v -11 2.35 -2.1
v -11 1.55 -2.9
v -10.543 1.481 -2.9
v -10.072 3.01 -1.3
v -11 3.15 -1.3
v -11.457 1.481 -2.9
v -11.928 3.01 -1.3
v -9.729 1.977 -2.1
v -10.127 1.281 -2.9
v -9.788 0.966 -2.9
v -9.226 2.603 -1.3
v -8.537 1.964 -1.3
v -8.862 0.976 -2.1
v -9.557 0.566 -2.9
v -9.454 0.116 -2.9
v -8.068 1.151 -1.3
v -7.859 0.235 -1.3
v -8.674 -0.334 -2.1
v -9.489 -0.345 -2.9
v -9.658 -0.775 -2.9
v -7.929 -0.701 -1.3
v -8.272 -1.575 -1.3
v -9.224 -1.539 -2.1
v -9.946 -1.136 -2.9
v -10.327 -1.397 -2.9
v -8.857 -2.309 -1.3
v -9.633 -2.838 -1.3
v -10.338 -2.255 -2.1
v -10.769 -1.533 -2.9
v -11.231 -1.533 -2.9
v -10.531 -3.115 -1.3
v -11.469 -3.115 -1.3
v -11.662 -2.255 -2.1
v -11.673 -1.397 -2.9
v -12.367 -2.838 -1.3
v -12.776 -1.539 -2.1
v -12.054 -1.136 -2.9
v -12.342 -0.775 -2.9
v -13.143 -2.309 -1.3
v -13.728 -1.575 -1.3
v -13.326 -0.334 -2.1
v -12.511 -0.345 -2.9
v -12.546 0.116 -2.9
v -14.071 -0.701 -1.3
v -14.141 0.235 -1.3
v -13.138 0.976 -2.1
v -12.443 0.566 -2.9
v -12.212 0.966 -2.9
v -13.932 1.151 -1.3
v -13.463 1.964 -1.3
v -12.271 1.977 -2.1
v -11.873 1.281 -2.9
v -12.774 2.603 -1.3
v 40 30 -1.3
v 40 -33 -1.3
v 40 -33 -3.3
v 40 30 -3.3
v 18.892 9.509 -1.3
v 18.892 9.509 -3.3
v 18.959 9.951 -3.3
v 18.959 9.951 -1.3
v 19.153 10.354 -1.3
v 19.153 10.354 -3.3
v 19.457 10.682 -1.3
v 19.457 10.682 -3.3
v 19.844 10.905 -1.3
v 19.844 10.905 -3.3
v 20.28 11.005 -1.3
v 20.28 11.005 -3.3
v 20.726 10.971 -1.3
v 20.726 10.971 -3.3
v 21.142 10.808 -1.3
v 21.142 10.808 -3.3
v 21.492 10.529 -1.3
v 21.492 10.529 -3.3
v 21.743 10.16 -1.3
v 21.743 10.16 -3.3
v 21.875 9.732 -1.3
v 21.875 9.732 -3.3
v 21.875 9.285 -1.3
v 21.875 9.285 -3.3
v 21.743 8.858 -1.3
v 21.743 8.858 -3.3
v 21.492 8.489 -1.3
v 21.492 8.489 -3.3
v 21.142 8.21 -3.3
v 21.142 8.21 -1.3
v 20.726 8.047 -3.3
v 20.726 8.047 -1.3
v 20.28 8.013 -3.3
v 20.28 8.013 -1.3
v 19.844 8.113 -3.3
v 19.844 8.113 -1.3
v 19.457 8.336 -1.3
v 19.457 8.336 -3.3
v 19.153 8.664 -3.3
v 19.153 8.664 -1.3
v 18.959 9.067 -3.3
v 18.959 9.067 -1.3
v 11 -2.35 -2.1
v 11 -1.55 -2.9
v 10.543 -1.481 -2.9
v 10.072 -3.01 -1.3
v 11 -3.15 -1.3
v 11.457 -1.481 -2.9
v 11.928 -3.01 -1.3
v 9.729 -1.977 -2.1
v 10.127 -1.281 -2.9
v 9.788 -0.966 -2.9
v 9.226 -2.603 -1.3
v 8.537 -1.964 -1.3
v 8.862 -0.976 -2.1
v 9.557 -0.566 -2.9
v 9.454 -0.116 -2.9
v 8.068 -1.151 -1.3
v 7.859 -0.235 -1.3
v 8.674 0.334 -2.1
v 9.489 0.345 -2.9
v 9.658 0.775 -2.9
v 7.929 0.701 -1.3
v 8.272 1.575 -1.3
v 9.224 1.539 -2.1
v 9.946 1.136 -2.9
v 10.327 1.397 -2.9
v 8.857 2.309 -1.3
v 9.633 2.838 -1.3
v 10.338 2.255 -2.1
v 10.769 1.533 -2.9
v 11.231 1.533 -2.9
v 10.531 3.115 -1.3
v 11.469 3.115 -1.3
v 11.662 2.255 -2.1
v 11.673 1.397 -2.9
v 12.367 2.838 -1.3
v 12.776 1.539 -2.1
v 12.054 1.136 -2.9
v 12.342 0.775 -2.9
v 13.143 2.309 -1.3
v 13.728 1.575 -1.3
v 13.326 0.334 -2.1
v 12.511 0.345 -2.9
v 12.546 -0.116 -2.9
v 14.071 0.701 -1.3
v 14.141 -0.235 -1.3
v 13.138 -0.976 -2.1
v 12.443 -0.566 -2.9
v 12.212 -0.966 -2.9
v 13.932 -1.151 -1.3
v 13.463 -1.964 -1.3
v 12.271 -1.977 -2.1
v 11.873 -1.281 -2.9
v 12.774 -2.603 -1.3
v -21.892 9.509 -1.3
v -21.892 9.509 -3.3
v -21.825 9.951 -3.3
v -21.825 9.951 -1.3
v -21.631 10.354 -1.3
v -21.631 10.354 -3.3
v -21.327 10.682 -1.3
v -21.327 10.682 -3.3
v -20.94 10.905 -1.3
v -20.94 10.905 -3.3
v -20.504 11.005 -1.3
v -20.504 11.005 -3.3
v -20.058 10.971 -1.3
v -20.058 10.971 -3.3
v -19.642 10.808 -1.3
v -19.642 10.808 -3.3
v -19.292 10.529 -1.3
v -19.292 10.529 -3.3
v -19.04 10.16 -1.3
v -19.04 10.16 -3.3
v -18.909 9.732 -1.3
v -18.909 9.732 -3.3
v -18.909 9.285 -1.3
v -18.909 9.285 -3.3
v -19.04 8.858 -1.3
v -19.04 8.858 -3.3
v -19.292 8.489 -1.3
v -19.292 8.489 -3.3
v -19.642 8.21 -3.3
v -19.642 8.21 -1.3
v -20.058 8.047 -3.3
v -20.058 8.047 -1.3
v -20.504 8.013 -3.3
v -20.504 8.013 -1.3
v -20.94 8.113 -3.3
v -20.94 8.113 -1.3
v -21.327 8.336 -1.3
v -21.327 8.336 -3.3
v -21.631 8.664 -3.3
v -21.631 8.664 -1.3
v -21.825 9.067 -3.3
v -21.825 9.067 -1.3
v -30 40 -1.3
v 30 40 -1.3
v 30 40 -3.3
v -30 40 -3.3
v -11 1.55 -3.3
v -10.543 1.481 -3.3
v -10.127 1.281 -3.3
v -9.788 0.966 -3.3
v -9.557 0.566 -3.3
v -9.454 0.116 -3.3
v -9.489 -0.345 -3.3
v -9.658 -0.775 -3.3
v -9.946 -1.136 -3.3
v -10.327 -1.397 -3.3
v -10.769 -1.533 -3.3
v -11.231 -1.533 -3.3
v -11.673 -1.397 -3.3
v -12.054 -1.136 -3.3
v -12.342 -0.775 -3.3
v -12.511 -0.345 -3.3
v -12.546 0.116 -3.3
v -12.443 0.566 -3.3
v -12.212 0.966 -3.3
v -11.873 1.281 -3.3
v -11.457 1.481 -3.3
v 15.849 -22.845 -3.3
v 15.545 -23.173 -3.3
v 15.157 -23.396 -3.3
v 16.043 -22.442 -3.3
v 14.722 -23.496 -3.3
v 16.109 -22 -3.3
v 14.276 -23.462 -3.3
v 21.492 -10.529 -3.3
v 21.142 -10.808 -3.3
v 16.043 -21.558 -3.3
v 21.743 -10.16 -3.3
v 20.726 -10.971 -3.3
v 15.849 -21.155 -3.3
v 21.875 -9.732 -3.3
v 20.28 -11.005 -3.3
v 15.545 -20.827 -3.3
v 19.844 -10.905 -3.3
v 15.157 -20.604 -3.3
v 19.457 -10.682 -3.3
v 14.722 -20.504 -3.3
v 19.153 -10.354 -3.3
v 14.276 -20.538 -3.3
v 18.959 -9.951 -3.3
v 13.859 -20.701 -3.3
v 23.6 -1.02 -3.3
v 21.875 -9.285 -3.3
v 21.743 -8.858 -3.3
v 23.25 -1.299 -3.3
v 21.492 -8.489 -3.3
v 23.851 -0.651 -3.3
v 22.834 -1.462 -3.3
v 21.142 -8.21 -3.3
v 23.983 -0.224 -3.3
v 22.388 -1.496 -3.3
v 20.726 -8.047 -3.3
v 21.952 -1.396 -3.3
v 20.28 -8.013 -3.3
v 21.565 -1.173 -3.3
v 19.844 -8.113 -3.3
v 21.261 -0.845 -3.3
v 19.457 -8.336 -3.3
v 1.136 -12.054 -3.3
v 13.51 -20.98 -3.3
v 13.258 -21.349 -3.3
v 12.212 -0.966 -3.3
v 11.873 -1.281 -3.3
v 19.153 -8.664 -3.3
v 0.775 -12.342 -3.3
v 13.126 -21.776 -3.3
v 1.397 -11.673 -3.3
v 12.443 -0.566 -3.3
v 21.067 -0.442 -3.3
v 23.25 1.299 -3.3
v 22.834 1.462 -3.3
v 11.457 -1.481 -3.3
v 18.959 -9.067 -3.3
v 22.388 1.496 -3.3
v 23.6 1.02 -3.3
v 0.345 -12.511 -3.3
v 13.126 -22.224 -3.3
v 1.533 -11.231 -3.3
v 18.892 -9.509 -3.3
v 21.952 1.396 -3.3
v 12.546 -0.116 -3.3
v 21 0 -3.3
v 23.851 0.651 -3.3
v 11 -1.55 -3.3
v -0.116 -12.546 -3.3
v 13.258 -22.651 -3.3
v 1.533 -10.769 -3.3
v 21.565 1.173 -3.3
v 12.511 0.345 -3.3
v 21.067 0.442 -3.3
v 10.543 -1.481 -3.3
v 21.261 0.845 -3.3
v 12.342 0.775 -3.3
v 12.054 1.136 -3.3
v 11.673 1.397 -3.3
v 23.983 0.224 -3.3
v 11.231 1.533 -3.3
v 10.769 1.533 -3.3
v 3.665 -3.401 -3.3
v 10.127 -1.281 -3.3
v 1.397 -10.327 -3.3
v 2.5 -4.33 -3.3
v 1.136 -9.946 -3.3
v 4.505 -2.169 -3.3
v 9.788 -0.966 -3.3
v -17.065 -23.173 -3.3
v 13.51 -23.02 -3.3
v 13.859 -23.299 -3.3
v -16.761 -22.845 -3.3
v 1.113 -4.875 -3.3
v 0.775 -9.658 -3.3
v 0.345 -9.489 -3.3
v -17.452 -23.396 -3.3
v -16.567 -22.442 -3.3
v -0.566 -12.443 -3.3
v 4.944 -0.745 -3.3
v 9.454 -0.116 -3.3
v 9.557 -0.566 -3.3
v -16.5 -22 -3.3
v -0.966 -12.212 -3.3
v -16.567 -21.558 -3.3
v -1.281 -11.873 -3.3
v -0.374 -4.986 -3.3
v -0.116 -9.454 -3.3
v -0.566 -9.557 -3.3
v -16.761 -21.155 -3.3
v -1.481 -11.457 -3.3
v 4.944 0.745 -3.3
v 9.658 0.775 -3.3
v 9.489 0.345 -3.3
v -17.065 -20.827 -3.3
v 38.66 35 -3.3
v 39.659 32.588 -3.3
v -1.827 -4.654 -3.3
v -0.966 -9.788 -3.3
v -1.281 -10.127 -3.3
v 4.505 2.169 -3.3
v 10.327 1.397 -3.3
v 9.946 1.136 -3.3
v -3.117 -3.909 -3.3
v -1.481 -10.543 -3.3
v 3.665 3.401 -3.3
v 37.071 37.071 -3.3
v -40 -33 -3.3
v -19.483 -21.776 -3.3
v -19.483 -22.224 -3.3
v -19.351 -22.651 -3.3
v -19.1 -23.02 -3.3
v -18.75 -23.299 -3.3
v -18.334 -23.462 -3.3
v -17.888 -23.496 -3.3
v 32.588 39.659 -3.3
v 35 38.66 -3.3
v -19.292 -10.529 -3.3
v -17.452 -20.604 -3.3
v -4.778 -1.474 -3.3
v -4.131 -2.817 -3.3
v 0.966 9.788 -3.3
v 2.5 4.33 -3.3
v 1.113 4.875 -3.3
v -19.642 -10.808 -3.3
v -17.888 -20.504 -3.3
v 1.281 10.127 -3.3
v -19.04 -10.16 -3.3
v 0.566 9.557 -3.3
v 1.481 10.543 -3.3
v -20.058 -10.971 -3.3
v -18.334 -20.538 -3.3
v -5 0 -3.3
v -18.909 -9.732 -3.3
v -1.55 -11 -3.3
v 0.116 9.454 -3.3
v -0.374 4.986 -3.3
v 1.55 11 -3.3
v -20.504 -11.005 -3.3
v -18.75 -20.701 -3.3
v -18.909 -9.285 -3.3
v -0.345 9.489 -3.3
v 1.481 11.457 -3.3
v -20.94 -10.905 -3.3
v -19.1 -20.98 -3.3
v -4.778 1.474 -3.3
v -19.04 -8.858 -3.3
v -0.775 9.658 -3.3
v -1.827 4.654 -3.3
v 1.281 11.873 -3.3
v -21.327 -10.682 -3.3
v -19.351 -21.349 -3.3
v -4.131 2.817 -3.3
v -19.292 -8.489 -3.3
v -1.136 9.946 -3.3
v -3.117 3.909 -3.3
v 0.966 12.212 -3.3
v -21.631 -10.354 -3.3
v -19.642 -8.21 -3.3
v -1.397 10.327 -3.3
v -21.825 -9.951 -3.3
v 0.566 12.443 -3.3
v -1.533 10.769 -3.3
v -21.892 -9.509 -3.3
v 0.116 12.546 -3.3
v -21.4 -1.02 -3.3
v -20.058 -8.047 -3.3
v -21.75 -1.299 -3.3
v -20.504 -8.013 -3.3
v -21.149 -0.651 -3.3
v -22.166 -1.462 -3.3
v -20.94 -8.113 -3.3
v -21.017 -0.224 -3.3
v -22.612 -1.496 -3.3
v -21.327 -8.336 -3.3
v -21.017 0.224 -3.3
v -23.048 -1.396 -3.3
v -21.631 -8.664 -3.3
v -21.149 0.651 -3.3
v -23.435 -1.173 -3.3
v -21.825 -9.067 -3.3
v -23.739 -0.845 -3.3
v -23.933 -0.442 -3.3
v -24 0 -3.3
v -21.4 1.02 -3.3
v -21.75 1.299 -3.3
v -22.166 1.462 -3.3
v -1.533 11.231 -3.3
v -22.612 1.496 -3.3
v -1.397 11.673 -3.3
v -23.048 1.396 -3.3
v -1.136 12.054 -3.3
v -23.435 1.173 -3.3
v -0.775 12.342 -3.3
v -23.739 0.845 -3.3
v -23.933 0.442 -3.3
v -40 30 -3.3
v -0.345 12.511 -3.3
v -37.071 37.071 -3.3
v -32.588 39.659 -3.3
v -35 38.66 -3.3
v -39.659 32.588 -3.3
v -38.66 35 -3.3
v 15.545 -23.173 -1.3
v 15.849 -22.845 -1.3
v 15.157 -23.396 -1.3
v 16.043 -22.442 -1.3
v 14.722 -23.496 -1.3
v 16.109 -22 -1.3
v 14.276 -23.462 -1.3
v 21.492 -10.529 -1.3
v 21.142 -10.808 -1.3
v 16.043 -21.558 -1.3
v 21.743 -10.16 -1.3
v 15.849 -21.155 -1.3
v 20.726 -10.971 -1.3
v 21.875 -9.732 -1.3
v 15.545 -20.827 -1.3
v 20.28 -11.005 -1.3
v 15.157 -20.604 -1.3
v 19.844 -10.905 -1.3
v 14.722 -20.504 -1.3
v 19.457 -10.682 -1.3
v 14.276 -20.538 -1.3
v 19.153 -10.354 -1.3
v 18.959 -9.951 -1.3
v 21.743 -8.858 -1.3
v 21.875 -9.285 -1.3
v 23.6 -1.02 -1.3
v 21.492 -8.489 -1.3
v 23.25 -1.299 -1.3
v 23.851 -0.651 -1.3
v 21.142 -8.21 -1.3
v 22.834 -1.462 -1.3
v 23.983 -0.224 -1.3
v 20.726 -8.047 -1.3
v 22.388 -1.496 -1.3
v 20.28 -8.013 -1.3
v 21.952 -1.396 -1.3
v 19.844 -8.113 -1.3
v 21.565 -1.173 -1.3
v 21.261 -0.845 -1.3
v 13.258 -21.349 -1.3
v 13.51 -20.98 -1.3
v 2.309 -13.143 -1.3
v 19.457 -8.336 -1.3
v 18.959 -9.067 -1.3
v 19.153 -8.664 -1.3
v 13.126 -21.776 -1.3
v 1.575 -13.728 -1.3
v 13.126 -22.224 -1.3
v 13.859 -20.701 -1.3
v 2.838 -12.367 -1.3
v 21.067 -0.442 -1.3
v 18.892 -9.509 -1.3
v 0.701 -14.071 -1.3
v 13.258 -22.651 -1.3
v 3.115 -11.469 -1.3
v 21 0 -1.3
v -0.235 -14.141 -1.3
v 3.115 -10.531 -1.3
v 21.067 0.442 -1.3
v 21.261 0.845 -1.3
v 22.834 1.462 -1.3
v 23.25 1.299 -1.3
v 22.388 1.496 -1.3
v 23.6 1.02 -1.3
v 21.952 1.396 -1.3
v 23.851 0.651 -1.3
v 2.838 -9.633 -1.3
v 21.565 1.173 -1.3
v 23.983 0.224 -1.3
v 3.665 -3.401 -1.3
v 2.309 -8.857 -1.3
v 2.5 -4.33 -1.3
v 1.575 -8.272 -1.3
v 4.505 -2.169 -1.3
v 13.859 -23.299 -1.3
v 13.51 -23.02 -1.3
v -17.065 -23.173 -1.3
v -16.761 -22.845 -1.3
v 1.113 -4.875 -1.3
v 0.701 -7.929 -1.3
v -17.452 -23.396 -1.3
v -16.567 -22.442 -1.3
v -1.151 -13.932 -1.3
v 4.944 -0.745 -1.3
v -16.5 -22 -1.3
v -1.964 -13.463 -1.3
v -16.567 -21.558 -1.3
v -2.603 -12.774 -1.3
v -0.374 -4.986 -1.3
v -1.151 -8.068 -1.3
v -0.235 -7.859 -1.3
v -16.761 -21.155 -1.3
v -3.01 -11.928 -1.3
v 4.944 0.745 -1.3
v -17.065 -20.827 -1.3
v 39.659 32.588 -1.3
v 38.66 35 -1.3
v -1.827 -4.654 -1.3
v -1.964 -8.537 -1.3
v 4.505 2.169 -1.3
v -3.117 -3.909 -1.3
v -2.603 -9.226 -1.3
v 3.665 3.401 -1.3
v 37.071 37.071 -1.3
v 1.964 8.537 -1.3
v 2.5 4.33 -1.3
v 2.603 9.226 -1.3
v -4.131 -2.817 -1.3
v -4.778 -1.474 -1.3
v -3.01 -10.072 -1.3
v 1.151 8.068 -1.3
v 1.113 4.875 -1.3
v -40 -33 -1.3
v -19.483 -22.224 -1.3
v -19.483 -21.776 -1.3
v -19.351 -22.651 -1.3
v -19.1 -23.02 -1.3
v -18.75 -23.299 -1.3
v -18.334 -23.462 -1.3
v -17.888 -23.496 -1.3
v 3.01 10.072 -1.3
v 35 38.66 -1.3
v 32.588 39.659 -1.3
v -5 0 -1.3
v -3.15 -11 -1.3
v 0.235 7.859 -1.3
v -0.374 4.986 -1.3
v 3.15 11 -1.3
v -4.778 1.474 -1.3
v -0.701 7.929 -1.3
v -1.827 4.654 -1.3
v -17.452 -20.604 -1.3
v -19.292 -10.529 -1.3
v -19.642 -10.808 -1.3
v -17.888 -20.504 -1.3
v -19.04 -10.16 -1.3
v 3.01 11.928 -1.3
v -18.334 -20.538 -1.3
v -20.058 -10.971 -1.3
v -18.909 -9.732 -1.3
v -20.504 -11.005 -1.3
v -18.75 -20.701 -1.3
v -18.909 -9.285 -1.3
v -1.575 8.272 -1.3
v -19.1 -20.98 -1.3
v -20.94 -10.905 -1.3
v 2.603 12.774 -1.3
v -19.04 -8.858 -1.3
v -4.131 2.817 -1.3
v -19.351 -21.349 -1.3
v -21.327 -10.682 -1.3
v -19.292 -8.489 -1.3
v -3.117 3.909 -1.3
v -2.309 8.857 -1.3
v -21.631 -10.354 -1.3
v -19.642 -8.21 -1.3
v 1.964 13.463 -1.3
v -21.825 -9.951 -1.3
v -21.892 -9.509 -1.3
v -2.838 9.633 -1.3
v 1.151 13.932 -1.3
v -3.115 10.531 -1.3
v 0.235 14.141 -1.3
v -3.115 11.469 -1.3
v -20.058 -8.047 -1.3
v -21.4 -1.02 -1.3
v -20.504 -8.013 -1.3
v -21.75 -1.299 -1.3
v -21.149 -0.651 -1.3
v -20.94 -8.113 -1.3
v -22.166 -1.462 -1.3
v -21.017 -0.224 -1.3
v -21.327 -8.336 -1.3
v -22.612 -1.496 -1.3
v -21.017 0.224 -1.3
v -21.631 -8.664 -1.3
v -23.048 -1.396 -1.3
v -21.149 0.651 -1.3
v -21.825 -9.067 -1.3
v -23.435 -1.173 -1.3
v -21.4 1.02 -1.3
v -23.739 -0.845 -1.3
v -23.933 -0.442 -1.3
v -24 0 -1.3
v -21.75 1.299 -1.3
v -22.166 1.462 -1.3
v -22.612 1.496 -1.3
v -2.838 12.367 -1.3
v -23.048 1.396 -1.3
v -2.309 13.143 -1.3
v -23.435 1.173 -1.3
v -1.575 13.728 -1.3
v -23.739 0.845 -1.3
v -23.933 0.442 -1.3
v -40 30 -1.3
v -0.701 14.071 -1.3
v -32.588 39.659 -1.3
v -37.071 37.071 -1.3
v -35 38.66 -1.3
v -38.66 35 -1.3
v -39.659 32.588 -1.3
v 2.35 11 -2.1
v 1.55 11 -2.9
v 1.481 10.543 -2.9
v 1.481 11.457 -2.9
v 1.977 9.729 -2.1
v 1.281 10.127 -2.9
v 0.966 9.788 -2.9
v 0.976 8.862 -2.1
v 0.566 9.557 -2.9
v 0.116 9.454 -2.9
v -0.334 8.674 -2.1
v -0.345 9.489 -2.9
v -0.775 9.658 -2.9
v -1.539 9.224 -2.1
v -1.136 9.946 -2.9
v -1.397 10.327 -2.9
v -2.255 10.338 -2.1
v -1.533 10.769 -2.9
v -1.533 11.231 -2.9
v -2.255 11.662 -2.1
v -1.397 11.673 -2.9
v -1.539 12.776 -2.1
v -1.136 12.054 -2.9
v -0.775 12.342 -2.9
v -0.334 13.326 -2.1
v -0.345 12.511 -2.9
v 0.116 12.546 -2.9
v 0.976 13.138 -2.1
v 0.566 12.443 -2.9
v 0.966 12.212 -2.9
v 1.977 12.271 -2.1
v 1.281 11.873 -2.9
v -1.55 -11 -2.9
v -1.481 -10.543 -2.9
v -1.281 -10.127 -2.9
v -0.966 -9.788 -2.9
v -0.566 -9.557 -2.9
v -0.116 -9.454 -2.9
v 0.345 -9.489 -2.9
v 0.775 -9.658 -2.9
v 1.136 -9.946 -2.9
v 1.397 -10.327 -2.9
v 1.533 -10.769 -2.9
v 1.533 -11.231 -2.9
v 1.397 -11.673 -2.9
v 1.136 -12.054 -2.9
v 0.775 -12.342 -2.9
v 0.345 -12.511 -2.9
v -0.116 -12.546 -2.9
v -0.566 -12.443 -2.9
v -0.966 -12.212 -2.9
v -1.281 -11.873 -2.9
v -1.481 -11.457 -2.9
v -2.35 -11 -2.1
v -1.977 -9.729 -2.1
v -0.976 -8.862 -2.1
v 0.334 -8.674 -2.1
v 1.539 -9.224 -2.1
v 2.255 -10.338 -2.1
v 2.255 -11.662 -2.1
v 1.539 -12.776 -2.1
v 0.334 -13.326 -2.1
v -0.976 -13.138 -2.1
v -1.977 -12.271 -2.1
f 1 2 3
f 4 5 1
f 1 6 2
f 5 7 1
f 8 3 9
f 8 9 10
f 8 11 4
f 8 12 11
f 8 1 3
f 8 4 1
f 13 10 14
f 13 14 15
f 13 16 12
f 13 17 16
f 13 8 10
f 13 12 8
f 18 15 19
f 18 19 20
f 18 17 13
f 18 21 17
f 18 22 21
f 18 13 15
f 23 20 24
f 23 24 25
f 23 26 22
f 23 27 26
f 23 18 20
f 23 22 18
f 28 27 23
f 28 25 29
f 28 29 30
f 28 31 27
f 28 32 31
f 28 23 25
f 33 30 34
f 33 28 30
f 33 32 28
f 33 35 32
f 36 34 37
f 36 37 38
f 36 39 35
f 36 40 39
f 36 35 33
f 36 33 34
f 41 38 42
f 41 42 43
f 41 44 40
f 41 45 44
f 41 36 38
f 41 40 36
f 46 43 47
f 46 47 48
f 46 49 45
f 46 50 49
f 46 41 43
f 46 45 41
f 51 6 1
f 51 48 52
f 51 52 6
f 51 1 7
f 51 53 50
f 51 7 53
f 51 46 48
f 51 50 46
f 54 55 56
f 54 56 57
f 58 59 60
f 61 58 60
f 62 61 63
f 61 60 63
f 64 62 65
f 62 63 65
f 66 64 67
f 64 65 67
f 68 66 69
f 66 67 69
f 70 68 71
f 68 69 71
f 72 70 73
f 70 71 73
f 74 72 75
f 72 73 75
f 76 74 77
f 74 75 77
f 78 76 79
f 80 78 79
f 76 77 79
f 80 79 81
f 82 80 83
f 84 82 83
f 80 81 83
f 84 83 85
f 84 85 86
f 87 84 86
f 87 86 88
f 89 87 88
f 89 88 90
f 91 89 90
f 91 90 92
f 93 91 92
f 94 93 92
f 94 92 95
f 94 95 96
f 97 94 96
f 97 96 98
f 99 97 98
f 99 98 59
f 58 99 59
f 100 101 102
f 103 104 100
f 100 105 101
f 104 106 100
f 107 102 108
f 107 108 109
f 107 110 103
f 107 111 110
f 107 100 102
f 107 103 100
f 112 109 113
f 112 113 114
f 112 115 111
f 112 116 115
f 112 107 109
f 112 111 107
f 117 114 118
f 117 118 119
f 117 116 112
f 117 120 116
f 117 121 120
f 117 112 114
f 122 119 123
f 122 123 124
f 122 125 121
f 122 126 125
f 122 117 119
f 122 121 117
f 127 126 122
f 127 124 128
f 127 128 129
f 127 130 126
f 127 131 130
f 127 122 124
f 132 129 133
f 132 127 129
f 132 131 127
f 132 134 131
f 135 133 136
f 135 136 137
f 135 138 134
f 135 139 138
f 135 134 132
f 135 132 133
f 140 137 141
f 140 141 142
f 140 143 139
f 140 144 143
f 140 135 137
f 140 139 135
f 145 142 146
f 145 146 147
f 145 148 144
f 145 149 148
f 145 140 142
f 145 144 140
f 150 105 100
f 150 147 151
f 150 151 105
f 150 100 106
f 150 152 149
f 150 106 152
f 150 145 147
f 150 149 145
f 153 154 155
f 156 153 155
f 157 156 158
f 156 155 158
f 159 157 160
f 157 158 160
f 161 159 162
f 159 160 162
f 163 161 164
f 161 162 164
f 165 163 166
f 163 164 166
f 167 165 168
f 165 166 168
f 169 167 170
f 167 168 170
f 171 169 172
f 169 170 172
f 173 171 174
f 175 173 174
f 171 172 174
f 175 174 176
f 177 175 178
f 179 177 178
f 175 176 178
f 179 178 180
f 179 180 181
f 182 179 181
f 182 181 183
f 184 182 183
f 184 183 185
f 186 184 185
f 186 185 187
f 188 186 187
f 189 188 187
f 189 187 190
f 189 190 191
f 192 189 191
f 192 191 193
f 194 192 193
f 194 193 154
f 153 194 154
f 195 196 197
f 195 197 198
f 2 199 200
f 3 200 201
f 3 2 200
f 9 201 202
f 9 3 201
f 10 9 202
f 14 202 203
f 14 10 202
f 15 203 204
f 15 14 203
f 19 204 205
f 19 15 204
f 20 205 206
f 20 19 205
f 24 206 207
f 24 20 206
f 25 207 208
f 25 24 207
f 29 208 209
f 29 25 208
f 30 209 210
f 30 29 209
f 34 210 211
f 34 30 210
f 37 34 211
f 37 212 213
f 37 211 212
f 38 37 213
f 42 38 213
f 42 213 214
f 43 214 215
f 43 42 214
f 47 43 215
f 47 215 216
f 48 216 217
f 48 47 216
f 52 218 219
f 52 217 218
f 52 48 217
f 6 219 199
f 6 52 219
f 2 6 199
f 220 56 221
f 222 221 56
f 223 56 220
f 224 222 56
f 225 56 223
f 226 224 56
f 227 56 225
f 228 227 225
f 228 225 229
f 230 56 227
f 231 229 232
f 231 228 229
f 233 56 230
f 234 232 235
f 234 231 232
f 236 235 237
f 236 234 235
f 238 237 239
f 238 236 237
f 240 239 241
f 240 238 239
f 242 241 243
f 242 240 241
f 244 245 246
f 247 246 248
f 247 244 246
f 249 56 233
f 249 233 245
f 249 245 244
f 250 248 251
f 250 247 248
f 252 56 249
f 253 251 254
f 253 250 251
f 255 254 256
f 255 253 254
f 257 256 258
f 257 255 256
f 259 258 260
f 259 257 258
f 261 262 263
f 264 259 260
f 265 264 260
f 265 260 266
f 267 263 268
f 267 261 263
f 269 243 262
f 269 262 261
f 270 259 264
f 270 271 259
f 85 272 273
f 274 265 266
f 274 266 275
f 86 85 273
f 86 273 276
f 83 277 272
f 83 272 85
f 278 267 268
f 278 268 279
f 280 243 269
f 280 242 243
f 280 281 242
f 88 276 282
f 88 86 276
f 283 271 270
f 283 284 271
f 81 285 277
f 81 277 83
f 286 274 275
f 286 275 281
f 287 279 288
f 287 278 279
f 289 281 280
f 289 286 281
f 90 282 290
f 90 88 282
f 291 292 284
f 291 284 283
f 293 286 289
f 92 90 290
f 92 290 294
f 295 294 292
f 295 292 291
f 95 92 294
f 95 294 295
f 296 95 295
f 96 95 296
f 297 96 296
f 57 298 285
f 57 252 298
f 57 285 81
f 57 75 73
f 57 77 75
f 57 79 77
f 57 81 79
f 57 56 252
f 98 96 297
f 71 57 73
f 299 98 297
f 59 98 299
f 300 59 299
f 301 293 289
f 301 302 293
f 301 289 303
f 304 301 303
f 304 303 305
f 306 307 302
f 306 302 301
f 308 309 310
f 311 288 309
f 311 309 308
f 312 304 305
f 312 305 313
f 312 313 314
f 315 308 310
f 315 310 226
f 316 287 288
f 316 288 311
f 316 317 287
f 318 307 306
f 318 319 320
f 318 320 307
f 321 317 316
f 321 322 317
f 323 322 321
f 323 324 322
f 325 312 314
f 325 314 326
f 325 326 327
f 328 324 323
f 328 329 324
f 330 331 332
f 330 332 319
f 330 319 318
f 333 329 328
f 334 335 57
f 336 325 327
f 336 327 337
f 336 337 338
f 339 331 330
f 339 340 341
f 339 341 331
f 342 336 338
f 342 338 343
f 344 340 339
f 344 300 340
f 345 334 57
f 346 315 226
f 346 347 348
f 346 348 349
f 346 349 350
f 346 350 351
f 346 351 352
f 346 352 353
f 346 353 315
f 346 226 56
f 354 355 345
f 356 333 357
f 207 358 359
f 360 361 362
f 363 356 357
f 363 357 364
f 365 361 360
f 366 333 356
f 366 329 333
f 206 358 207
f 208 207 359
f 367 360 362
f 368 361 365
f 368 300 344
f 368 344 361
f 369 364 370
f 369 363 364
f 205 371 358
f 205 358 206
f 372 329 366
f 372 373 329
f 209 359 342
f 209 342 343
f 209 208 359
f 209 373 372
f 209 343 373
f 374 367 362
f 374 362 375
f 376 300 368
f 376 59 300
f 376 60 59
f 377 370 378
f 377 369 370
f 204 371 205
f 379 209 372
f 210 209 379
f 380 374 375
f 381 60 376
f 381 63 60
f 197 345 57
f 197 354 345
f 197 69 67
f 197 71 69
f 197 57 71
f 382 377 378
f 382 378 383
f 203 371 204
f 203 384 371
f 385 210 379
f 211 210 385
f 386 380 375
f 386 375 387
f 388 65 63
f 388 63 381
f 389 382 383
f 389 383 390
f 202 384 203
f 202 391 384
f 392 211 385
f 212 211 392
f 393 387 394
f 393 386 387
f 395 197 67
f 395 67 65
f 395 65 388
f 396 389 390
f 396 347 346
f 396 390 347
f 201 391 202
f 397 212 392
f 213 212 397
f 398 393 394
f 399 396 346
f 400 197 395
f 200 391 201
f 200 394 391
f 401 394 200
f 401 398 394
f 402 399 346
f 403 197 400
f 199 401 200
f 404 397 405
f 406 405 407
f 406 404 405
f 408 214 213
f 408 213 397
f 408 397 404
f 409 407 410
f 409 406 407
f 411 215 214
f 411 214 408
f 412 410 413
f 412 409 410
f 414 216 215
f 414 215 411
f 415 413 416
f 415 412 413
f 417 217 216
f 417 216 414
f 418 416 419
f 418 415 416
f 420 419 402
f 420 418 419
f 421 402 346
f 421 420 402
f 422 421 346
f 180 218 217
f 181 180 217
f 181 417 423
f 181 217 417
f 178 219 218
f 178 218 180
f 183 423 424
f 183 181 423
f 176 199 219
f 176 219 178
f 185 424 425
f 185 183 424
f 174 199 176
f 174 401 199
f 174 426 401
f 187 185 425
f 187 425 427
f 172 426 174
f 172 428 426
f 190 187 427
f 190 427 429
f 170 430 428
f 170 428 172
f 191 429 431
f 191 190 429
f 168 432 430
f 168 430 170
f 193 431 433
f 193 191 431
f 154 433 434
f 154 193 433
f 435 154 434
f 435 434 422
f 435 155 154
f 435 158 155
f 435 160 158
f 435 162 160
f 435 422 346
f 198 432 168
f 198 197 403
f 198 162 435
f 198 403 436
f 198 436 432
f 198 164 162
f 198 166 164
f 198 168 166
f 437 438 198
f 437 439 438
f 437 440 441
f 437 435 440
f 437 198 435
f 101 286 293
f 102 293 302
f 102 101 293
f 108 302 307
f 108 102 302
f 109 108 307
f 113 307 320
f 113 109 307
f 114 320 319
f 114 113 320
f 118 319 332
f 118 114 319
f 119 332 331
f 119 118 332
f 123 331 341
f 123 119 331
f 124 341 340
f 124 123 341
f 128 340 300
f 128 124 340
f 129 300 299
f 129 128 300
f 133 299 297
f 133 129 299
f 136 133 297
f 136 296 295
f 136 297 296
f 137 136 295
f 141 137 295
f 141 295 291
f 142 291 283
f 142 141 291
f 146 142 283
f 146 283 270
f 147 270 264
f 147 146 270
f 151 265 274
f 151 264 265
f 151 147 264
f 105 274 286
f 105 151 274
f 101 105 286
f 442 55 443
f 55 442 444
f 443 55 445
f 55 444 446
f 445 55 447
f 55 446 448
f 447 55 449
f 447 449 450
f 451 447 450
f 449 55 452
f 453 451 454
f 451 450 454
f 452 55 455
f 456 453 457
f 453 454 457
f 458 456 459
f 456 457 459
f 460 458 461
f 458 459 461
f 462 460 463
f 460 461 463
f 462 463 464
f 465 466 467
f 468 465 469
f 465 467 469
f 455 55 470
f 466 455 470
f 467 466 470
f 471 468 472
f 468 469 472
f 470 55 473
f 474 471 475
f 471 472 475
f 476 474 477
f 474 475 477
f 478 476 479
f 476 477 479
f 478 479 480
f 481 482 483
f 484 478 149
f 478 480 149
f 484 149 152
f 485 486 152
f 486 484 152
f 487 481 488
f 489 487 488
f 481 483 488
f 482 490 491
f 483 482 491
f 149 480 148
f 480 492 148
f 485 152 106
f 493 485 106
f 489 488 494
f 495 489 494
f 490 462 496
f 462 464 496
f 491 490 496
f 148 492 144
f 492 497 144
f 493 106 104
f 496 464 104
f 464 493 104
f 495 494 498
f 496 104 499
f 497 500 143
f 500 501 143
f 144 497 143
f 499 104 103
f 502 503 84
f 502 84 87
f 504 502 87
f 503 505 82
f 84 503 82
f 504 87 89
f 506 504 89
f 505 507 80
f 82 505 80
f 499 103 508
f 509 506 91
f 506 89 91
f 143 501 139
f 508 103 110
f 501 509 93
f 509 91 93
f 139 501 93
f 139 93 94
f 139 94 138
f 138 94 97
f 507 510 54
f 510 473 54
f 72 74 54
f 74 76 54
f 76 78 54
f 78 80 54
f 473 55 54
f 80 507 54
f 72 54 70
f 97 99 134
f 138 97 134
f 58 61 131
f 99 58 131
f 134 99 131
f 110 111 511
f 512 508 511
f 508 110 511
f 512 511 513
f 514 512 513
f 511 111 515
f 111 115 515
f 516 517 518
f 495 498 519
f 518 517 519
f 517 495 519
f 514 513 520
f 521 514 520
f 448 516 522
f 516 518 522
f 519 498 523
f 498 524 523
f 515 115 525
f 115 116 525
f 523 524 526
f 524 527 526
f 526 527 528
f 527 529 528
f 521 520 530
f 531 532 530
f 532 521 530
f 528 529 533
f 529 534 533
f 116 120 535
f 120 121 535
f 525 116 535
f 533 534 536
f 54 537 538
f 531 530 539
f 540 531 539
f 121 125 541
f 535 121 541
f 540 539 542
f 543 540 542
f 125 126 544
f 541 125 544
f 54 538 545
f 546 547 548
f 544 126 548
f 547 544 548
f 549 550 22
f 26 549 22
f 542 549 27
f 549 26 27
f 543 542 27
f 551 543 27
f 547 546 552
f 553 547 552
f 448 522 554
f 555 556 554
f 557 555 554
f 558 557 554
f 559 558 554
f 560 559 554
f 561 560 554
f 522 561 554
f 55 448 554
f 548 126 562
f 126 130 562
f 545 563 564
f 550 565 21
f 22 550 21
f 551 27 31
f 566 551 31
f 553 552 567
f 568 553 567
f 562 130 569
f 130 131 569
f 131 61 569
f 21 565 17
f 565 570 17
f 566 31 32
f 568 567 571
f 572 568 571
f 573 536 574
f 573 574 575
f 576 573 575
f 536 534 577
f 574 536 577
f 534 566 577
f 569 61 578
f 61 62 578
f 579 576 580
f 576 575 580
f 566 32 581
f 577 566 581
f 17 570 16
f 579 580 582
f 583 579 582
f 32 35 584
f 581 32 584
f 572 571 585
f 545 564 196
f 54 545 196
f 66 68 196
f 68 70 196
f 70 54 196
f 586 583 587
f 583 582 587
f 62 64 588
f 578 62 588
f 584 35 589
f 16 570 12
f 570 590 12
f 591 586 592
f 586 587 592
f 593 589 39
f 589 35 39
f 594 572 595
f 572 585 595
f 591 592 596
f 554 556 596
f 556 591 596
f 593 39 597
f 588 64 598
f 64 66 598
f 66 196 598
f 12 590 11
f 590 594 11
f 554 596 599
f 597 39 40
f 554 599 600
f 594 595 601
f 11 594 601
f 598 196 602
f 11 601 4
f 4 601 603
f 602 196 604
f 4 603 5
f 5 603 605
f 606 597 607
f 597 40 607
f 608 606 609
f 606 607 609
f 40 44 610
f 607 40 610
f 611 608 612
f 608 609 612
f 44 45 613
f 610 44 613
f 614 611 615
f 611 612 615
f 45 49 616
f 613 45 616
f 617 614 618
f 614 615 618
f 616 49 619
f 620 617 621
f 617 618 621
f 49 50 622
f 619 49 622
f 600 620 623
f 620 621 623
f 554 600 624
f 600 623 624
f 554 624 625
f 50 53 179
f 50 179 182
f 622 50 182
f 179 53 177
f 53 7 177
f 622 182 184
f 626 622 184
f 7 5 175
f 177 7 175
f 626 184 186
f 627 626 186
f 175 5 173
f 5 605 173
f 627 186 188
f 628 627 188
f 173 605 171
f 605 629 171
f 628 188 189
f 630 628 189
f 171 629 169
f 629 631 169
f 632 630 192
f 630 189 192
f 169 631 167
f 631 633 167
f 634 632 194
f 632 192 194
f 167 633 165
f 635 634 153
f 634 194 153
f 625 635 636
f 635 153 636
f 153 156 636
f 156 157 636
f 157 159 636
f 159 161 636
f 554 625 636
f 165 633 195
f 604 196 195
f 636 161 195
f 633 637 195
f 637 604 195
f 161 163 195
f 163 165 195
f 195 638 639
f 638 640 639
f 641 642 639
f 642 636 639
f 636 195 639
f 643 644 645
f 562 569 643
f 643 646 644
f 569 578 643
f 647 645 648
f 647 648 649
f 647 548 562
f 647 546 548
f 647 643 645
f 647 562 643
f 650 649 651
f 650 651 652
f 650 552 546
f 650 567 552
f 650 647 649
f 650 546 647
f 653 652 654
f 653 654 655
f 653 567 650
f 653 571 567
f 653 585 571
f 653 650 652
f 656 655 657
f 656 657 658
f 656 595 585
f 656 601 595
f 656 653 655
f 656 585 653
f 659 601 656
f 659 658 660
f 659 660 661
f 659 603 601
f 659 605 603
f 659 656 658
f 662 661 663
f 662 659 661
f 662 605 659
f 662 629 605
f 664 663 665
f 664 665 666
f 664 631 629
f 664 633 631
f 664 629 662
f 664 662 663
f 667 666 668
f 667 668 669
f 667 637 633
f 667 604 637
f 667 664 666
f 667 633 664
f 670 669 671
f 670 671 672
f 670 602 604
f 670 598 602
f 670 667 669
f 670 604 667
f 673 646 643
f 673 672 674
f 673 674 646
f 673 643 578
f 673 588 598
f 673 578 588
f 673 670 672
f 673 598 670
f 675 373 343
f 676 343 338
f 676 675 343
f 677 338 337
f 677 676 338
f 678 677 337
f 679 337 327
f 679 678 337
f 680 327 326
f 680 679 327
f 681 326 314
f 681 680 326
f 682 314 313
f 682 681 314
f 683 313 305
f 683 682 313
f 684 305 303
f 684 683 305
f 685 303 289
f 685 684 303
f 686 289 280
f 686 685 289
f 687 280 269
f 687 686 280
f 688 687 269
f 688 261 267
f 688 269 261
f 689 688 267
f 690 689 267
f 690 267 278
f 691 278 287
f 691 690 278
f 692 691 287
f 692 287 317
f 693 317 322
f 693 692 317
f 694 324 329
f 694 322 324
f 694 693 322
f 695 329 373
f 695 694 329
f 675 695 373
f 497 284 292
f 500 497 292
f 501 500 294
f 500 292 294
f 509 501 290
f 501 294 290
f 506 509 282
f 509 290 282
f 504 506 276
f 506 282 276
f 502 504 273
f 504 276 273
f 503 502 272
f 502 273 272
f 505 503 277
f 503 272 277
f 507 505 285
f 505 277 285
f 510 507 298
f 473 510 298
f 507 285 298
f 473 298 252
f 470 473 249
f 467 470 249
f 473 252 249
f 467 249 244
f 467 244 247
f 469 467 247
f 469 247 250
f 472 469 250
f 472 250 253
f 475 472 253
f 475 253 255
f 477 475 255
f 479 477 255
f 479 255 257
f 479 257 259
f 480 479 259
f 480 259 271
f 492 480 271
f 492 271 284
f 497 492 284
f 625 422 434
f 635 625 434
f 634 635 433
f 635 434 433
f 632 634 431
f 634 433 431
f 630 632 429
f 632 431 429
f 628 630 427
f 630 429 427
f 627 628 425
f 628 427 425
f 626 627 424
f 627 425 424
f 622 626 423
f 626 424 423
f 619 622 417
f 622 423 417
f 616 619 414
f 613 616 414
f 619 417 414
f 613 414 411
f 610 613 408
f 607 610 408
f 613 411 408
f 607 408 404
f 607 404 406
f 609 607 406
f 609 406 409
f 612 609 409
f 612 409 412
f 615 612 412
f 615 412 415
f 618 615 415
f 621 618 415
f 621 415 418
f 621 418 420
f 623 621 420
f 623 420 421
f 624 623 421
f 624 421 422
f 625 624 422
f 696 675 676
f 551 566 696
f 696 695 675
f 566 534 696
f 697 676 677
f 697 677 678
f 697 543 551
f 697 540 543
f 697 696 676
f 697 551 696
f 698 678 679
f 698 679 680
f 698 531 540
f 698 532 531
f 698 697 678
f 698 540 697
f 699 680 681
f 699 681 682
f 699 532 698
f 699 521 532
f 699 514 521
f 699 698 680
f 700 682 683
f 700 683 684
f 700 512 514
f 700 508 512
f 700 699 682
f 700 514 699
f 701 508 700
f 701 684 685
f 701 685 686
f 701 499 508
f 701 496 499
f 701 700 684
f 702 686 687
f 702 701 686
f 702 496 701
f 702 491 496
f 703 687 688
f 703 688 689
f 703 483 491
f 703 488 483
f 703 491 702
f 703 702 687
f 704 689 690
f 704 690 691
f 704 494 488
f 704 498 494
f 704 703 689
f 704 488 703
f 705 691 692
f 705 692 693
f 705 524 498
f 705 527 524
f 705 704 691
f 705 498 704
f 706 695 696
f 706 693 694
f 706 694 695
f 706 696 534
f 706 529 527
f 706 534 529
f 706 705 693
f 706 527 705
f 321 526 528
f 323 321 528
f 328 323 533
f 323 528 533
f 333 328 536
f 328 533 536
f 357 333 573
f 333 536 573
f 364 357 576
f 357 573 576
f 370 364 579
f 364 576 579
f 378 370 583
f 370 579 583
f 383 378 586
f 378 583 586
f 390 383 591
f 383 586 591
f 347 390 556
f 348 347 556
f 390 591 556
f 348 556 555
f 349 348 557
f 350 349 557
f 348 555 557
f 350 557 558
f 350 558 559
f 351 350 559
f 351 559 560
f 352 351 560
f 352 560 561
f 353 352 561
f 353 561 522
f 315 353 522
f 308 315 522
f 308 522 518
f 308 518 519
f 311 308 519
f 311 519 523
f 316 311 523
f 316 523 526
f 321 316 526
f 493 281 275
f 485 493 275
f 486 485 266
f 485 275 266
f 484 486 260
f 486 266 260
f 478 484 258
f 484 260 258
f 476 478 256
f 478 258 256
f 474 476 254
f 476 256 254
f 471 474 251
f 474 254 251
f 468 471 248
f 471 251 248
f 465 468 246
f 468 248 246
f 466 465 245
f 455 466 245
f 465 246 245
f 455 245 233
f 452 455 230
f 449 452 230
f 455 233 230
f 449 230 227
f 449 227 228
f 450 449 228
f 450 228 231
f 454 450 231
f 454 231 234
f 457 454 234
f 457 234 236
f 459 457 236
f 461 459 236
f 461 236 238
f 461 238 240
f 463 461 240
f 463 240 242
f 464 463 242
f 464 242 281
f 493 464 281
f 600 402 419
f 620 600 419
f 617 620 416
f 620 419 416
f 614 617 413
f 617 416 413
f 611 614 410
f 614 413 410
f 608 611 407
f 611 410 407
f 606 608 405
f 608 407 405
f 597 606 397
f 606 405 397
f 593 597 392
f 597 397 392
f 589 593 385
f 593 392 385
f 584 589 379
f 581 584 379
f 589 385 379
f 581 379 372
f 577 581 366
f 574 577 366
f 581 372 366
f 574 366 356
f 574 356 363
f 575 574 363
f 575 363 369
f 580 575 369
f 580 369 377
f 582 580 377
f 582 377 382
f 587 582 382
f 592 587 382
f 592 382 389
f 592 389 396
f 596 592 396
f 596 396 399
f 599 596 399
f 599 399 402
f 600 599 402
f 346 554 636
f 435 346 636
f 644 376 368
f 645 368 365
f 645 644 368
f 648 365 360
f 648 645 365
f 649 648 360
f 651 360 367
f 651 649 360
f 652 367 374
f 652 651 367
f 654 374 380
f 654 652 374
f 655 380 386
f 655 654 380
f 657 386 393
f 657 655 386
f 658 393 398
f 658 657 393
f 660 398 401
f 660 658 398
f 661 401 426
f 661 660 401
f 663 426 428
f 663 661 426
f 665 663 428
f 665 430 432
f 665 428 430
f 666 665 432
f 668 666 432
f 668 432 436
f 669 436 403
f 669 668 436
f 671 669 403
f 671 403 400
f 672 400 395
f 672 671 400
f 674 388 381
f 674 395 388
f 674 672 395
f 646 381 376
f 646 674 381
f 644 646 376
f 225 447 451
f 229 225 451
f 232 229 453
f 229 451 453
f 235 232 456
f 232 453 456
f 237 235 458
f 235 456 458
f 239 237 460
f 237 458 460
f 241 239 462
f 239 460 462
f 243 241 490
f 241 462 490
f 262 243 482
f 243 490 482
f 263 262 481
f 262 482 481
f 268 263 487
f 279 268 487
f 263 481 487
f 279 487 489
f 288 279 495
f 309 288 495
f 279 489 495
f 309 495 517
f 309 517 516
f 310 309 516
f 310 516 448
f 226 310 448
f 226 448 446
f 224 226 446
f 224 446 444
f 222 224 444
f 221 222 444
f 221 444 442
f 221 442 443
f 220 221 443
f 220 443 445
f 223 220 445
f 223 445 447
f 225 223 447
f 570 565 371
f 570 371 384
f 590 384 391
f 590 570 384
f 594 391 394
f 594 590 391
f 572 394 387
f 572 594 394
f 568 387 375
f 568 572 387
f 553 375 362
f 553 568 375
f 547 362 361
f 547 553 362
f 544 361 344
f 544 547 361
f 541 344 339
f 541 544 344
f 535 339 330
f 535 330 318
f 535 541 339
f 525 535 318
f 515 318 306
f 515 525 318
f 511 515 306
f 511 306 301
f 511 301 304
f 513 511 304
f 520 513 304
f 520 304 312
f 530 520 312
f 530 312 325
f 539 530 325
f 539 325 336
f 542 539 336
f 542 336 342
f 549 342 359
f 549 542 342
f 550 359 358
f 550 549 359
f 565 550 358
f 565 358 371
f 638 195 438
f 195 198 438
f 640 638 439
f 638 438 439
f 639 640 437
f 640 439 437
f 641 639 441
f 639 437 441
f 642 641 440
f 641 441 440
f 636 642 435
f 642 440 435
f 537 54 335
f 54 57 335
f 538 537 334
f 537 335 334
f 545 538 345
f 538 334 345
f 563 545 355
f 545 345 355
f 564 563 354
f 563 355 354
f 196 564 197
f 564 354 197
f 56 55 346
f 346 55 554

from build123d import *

# Parameters (mm, degrees)
SKETCH_1_W               = 80
SKETCH_1_H               = 73
SKETCH_1_R               = 5
EXTRUDE_1_DEPTH          = 2
PATTERN_CIRCULAR_1_COUNT = 4
FILLET_1_R               = 10
MM_TRANSITIONAL_1_D      = 3
MM_TRANSITIONAL_2_D      = 3


with BuildPart() as part:
    # 草图1 → 凸台-拉伸1 (new body)
    with BuildSketch(Plane(origin=(0, 0, -1.3), x_dir=(-1, 0, 0), z_dir=(0, 0, -1))):
        with Locations((0, 3.5)):
            Rectangle(SKETCH_1_W, SKETCH_1_H)
        Circle(SKETCH_1_R, mode=Mode.SUBTRACT)
    extrude(amount=EXTRUDE_1_DEPTH)

    # 草图3 → 打孔尺寸(%根据十字)槽沉头自攻螺钉的类型1 (revolve, cut)
    with BuildSketch(Plane(origin=(11, 0, -1.3), x_dir=(0, -1, 0), z_dir=(1, 0, 0))):
        Polygon((0, 0), (0, 5.431333959), (1.55, 4.5), (1.55, 1.6), (3.15, 0), align=None)
    hole_wizard_1 = revolve(axis=Axis((11, 0, 5.05), (0, 0, -1)), mode=Mode.SUBTRACT)

    # 阵列(圆周)1: 打孔尺寸(%根据十字)槽沉头自攻螺钉的类型1 ×4 about axis
    pattern_circular_1_axis = Axis((0, 0, 0), (0, 0, 1))
    for i in range(1, PATTERN_CIRCULAR_1_COUNT):
        add(hole_wizard_1.rotate(pattern_circular_1_axis, i * 360 / PATTERN_CIRCULAR_1_COUNT), mode=Mode.SUBTRACT)

    # 圆角1
    fillet_1_edges = [part.edges().sort_by_distance(p)[0] for p in [
        (40, 40, -2.3),
        (-40, 40, -2.3),
    ]]
    fillet(fillet_1_edges, radius=FILLET_1_R)

    # 大小mm Transitional 暗销孔1 (through all)
    with Locations(Plane(origin=(0, 0, -3.3), x_dir=(-1, 0, 0), z_dir=(0, 0, -1))):
        with Locations((-14.60943136, -22), (18, -22)):
            Hole(MM_TRANSITIONAL_1_D / 2)

    # 大小mm Transitional 暗销孔2 (through all)
    with Locations(Plane.XY.offset(-1.3)):
        with Locations((-20.391925208, -9.508910889), (-22.5, 0), (-20.391925208, 9.508910889), (20.391925208, -9.508910889), (22.5, 0), (20.391925208, 9.508910889)):
            Hole(MM_TRANSITIONAL_2_D / 2)


solid = part.part
